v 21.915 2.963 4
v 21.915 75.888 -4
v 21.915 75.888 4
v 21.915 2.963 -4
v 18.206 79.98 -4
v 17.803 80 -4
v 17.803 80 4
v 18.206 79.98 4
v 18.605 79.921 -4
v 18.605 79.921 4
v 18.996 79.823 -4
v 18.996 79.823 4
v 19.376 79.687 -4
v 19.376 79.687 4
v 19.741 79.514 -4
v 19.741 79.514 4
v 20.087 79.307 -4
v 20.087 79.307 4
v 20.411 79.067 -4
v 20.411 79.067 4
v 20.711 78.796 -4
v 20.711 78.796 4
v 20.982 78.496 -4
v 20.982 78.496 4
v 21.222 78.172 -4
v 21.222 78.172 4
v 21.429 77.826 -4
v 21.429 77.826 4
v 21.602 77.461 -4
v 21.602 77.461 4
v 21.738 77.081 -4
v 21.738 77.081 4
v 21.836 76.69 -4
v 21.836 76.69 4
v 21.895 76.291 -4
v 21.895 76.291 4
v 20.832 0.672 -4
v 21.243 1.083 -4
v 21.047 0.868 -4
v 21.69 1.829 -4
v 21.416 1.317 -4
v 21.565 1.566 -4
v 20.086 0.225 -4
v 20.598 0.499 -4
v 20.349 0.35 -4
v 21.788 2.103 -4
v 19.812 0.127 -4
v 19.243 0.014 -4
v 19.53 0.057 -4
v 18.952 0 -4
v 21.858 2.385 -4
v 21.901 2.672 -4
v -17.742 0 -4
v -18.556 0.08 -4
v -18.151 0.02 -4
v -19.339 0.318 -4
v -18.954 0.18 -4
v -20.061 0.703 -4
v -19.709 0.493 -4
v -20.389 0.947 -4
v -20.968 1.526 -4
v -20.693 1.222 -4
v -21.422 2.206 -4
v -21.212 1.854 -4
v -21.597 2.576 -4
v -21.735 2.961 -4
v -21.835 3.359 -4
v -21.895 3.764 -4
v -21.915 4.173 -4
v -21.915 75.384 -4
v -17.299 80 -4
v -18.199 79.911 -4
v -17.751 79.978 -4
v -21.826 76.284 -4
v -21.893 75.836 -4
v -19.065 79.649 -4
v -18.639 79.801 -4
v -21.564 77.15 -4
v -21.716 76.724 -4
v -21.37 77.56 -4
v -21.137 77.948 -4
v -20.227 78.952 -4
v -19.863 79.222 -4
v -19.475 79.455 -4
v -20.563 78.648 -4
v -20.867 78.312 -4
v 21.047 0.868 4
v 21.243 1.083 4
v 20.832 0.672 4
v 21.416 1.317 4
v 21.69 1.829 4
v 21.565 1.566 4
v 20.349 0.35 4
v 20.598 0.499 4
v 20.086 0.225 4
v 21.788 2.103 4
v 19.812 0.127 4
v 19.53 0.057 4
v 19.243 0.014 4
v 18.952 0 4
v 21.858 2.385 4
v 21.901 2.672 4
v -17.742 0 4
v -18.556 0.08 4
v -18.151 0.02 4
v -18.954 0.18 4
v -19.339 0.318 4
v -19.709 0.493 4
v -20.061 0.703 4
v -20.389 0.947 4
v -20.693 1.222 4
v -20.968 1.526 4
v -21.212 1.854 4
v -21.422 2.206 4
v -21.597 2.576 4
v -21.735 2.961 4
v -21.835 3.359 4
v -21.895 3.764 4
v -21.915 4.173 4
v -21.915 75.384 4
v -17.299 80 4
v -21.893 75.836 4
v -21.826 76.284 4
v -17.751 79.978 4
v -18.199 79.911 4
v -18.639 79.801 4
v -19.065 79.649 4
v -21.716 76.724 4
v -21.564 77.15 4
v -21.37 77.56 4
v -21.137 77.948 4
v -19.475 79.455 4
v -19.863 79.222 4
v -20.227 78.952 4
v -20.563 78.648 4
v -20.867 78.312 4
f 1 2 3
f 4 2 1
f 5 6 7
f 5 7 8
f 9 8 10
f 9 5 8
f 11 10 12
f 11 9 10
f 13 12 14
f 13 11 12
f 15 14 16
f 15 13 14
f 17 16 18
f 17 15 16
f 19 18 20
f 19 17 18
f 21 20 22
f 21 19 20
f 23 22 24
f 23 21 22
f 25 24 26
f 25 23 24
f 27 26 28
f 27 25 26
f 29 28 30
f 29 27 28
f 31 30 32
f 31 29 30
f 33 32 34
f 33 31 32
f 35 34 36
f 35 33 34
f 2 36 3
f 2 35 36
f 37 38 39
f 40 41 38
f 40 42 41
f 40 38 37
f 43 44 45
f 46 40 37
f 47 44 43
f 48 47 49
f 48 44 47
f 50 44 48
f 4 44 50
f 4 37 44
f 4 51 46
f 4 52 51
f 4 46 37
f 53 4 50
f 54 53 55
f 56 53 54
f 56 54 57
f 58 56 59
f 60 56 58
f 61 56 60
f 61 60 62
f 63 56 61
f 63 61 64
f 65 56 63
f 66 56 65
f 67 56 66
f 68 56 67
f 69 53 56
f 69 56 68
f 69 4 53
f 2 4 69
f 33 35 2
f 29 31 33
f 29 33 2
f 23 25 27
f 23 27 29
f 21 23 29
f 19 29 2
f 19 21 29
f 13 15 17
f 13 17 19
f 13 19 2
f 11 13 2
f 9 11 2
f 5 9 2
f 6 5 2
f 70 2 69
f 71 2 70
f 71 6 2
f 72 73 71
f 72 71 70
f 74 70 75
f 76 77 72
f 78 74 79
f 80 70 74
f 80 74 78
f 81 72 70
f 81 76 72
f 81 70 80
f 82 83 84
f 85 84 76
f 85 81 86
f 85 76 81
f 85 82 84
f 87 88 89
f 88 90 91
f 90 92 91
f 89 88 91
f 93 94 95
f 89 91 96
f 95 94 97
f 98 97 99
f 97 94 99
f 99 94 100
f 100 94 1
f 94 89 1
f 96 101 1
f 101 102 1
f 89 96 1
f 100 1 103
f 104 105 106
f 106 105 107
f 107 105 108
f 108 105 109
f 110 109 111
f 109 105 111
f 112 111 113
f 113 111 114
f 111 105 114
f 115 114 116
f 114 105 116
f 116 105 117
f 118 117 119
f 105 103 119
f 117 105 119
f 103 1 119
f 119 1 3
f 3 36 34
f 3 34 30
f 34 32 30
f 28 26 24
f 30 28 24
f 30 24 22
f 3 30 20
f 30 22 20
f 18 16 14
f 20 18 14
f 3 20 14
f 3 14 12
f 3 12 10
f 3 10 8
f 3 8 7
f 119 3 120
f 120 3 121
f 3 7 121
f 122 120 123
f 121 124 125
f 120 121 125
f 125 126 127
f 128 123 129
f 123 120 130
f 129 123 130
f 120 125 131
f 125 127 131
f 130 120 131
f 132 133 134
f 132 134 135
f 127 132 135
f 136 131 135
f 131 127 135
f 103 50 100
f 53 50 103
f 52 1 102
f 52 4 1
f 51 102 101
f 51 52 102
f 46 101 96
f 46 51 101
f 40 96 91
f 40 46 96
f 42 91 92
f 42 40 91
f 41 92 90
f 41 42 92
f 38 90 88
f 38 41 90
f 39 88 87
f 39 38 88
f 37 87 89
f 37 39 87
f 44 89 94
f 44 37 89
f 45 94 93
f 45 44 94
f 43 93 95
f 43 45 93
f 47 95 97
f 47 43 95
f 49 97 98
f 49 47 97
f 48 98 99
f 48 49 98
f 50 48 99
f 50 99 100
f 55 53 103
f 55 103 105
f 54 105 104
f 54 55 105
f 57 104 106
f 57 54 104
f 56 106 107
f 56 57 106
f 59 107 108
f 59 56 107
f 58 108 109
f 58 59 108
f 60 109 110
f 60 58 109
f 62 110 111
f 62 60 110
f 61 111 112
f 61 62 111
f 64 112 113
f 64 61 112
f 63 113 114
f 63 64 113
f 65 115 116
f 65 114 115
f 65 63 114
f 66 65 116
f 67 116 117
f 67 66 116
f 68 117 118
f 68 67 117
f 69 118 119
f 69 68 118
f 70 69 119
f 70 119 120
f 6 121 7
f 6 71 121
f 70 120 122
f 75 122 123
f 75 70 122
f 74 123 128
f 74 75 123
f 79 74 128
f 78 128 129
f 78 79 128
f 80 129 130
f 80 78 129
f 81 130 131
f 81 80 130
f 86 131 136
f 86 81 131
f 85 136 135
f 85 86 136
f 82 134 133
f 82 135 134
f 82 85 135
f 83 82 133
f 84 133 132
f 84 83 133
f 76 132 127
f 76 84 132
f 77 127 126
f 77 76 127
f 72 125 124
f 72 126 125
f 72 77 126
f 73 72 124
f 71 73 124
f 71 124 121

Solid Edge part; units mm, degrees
sketch "Sketch1" plane through (0, 0, 0) normal (0, 0, 1) x (1, 0, 0)
  line L0 (-17.2988, 80) -> (17.8026, 80)
  arc A0 (17.8026, 80) -> (21.915, 75.8876) centre (17.8026, 75.8876) cw
  line L1 (21.915, 75.8876) -> (21.915, 2.9629)
  arc A1 (18.9521, 0) -> (21.915, 2.9629) centre (18.9521, 2.9629) ccw
  line L2 (18.9521, 0) -> (-17.7424, 0)
  arc A2 (-21.915, 4.1726) -> (-17.7424, 0) centre (-17.7424, 4.1726) ccw
  line L3 (-21.915, 4.1726) -> (-21.915, 75.3838)
  arc A3 (-17.2988, 80) -> (-21.915, 75.3838) centre (-17.2988, 75.3838) ccw
  dimension "D1" = 43.83
  dimension "D2" = 80
extrude "Ajout_matière_1" add sketch "Sketch1" along normal mid plane 8
properties material "Acier S235"
